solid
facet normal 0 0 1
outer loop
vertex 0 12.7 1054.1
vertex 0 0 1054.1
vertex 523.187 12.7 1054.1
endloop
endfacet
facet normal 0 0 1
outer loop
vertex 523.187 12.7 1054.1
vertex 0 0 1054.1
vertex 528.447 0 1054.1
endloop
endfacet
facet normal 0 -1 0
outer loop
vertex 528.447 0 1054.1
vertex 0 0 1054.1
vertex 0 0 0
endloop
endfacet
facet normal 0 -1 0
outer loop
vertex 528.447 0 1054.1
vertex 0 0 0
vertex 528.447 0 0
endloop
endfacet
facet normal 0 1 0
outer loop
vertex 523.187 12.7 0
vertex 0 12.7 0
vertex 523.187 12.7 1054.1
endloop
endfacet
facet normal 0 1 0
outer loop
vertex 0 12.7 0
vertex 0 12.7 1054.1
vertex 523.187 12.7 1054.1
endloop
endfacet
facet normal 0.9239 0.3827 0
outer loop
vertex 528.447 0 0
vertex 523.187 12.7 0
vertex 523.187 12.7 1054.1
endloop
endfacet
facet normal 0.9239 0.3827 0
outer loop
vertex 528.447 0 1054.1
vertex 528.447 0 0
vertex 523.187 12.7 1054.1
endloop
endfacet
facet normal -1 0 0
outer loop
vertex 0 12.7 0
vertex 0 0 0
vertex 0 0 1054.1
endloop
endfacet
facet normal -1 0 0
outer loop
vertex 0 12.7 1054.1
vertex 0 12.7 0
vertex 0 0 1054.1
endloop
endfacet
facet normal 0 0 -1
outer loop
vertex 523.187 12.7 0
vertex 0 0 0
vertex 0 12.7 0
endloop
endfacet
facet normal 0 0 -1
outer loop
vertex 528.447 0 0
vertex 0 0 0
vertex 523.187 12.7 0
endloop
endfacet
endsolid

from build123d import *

# Parameters (mm, degrees)
F0_W     = 528.4471722421
F0_H     = 1054.1
F1_DEPTH = 12.7
F2_SIZE2 = 5.260502
F2_SIZE  = 12.69999


# Not quite as in the source:
# - a fillet or chamfer is up to 0.001 mm smaller than in the source, because OpenCascade refuses the exact size


with BuildPart() as f1:
    # F0 (on Front) → F1 (new body)
    with BuildSketch(Plane.XZ):
        with Locations((264.2235861211, 527.05)):
            Rectangle(F0_W, F0_H)
    extrude(amount=-F1_DEPTH)

    # F2 (size 12.7 and 5.2605122421 in the source; OpenCascade refuses exactly that, so slightly less here)
    f2_edges = [f1.edges().sort_by_distance(p)[0] for p in [
        (528.447172, 12.7, 527.05),
    ]]
    f2_side = f1.faces().sort_by_distance((528.447172, 6.35, 527.05))[0]
    chamfer(f2_edges, length=F2_SIZE, length2=F2_SIZE2, reference=f2_side)


solid = f1.part
